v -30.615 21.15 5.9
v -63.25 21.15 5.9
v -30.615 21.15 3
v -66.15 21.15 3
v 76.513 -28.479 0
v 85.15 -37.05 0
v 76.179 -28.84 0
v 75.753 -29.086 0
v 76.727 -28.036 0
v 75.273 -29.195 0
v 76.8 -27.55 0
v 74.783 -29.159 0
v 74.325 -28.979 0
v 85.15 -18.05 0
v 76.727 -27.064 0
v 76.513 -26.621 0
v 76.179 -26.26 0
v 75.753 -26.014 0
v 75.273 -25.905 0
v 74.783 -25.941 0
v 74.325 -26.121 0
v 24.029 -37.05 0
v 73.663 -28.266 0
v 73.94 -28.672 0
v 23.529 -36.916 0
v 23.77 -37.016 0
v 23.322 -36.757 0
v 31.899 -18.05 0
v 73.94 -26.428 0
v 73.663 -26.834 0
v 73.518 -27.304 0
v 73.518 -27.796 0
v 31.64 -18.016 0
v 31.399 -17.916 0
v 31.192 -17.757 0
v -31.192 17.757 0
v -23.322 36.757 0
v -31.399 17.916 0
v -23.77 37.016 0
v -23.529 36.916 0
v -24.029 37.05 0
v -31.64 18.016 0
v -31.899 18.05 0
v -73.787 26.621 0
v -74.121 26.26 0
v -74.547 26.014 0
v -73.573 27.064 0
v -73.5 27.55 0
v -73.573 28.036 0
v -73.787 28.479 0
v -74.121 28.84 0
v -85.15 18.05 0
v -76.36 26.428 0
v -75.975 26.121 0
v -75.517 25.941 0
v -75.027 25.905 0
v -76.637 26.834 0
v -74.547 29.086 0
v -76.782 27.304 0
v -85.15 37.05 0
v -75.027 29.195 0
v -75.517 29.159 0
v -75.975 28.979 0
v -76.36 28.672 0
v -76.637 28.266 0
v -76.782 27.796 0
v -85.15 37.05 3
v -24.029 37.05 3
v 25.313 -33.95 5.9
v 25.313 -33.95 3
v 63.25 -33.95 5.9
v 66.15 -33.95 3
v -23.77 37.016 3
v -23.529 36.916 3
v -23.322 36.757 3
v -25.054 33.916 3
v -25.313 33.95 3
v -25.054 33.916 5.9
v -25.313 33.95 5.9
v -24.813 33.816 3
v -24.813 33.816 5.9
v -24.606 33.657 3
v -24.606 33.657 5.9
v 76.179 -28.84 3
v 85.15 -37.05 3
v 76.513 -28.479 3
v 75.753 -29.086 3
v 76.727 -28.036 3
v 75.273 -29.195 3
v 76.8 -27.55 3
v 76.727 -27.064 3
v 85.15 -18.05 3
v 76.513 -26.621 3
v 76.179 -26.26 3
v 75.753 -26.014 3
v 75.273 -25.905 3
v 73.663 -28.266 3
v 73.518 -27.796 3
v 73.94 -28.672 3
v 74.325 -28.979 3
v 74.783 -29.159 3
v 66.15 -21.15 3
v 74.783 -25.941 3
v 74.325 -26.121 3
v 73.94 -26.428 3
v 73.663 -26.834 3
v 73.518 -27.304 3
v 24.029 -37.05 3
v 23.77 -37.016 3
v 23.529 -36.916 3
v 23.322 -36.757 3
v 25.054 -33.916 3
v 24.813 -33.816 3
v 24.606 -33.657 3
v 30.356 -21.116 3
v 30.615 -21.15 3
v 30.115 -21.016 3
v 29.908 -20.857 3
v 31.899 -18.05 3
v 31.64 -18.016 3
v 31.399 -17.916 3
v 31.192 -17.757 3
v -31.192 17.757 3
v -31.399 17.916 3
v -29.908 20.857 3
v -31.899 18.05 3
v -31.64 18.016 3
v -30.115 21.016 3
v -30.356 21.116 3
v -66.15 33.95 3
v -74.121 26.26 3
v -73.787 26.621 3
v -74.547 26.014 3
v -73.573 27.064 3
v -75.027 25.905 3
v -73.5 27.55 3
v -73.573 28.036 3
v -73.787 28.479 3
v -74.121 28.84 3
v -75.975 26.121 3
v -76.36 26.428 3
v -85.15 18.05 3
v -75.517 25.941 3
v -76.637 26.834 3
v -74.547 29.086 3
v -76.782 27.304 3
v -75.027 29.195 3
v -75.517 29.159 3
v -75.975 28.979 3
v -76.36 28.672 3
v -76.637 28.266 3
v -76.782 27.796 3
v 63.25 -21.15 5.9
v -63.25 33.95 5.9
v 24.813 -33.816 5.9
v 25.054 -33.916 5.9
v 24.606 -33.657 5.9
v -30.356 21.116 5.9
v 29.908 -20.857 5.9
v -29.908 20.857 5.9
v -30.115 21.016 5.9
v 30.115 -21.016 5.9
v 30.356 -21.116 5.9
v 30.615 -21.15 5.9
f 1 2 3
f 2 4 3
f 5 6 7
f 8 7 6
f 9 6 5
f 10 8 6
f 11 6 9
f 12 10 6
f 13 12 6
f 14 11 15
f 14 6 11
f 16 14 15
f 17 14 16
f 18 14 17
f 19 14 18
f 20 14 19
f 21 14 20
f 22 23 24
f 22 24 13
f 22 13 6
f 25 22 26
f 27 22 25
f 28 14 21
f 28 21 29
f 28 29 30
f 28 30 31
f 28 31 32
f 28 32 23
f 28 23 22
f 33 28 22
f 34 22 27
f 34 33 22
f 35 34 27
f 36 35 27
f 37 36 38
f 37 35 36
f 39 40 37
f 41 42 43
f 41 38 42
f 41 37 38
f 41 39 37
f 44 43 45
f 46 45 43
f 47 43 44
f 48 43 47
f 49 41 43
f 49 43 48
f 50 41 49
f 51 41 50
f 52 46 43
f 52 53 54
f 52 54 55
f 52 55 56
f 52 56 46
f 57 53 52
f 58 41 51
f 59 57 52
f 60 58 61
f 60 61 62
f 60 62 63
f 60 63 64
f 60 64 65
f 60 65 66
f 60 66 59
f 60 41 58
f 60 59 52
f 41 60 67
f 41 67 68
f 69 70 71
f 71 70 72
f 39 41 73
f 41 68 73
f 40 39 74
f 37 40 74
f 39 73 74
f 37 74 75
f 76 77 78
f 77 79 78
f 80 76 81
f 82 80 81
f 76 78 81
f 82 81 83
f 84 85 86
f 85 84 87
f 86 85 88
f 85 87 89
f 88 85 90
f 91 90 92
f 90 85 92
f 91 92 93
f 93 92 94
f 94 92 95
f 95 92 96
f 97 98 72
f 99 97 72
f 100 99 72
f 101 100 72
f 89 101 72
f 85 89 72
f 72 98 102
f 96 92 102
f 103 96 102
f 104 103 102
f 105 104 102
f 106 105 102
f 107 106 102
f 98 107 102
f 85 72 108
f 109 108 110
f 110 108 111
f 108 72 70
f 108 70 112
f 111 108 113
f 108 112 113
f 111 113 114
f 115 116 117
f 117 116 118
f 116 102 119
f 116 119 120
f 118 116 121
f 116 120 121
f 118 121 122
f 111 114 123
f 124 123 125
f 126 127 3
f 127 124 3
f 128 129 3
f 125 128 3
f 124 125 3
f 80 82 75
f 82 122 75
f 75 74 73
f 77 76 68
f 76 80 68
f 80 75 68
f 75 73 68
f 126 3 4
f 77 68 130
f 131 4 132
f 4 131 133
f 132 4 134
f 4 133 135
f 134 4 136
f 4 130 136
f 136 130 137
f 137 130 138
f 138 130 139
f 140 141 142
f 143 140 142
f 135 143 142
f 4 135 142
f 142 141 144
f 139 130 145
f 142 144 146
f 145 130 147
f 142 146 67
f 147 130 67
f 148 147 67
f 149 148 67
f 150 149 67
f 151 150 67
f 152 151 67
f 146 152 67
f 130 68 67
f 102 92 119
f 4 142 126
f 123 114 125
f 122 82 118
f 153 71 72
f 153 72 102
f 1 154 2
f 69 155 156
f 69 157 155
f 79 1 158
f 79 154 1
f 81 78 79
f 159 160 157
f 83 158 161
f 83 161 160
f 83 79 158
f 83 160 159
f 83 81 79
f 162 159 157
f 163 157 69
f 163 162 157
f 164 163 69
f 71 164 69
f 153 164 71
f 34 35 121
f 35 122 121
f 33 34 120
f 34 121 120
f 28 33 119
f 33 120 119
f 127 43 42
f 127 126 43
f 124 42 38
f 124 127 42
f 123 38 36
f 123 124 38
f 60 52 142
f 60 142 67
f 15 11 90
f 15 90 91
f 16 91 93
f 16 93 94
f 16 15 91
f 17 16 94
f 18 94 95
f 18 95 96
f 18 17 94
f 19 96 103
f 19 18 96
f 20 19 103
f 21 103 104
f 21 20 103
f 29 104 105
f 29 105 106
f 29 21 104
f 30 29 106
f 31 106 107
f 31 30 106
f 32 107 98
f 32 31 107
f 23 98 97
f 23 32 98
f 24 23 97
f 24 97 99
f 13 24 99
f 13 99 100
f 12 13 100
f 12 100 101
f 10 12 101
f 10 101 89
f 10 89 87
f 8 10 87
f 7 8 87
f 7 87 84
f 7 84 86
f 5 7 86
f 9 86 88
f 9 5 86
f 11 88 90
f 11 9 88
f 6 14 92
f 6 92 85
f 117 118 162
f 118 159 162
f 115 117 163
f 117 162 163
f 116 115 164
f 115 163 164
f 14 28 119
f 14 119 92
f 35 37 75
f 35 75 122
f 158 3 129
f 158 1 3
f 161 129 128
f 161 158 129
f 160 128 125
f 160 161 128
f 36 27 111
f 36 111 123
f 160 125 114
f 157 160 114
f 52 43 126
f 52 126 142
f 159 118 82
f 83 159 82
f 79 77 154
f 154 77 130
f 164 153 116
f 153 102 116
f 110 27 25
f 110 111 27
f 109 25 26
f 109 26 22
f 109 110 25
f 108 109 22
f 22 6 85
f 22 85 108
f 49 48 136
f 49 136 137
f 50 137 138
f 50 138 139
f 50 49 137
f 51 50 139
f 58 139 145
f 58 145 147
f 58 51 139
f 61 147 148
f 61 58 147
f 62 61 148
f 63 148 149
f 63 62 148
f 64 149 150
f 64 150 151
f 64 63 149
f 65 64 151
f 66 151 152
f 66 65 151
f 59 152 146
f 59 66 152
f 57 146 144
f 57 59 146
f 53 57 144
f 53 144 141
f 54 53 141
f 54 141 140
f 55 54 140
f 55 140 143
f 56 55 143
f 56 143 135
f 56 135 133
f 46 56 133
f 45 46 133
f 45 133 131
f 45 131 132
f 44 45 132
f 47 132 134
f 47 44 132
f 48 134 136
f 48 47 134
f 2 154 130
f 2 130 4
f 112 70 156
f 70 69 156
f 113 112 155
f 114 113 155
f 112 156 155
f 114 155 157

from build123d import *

# Parameters (mm, degrees)
SKETCH_1_R      = 1.65
EXTRUDE_1_DEPTH = 3
EXTRUDE_2_DEPTH = 2.9
CHAMFER_1_SIZE  = 2.9
FILLET_1_R      = 1


with BuildPart() as part:
    # 草图1 → 凸台-拉伸1 (new body)
    with BuildSketch(Plane.XY):
        Polygon((-85.15, 37.05), (-23.614971157, 37.05), (31.485028843, -18.05), (85.15, -18.05), (85.15, -37.05), (23.614971157, -37.05), (-31.485028843, 18.05), (-85.15, 18.05), align=None)
        with Locations((-75.15, 27.55)):
            Circle(SKETCH_1_R, mode=Mode.SUBTRACT)
        with Locations((75.15, -27.55)):
            Circle(SKETCH_1_R, mode=Mode.SUBTRACT)
    extrude(amount=EXTRUDE_1_DEPTH)

    # 草图2 → 凸台-拉伸2 (add)
    with BuildSketch(Plane.XY.offset(3)):
        Polygon((-66.15, 33.95), (-66.15, 21.15), (-30.200966799, 21.15), (24.899033201, -33.95), (66.15, -33.95), (66.15, -21.15), (30.200966799, -21.15), (-24.899033201, 33.95), align=None)
    extrude(amount=EXTRUDE_2_DEPTH)

    # 倒角1
    chamfer_1_edges = [part.edges().sort_by_distance(p)[0] for p in [
        (66.15, -27.55, 5.9),
        (-66.15, 27.55, 5.9),
    ]]
    chamfer(chamfer_1_edges, length=CHAMFER_1_SIZE - 0.0001)  # a hair under: the kernel refuses the full size

    # 圆角1
    fillet_1_edges = [part.edges().sort_by_distance(p)[0] for p in [
        (-23.614971157, 37.05, 1.5),
        (31.485028843, -18.05, 1.5),
        (23.614971157, -37.05, 1.5),
        (-31.485028843, 18.05, 1.5),
        (-24.899033201, 33.95, 4.45),
        (-30.200966799, 21.15, 4.45),
        (24.899033201, -33.95, 4.45),
        (30.200966799, -21.15, 4.45),
    ]]
    fillet(fillet_1_edges, radius=FILLET_1_R)


solid = part.part
